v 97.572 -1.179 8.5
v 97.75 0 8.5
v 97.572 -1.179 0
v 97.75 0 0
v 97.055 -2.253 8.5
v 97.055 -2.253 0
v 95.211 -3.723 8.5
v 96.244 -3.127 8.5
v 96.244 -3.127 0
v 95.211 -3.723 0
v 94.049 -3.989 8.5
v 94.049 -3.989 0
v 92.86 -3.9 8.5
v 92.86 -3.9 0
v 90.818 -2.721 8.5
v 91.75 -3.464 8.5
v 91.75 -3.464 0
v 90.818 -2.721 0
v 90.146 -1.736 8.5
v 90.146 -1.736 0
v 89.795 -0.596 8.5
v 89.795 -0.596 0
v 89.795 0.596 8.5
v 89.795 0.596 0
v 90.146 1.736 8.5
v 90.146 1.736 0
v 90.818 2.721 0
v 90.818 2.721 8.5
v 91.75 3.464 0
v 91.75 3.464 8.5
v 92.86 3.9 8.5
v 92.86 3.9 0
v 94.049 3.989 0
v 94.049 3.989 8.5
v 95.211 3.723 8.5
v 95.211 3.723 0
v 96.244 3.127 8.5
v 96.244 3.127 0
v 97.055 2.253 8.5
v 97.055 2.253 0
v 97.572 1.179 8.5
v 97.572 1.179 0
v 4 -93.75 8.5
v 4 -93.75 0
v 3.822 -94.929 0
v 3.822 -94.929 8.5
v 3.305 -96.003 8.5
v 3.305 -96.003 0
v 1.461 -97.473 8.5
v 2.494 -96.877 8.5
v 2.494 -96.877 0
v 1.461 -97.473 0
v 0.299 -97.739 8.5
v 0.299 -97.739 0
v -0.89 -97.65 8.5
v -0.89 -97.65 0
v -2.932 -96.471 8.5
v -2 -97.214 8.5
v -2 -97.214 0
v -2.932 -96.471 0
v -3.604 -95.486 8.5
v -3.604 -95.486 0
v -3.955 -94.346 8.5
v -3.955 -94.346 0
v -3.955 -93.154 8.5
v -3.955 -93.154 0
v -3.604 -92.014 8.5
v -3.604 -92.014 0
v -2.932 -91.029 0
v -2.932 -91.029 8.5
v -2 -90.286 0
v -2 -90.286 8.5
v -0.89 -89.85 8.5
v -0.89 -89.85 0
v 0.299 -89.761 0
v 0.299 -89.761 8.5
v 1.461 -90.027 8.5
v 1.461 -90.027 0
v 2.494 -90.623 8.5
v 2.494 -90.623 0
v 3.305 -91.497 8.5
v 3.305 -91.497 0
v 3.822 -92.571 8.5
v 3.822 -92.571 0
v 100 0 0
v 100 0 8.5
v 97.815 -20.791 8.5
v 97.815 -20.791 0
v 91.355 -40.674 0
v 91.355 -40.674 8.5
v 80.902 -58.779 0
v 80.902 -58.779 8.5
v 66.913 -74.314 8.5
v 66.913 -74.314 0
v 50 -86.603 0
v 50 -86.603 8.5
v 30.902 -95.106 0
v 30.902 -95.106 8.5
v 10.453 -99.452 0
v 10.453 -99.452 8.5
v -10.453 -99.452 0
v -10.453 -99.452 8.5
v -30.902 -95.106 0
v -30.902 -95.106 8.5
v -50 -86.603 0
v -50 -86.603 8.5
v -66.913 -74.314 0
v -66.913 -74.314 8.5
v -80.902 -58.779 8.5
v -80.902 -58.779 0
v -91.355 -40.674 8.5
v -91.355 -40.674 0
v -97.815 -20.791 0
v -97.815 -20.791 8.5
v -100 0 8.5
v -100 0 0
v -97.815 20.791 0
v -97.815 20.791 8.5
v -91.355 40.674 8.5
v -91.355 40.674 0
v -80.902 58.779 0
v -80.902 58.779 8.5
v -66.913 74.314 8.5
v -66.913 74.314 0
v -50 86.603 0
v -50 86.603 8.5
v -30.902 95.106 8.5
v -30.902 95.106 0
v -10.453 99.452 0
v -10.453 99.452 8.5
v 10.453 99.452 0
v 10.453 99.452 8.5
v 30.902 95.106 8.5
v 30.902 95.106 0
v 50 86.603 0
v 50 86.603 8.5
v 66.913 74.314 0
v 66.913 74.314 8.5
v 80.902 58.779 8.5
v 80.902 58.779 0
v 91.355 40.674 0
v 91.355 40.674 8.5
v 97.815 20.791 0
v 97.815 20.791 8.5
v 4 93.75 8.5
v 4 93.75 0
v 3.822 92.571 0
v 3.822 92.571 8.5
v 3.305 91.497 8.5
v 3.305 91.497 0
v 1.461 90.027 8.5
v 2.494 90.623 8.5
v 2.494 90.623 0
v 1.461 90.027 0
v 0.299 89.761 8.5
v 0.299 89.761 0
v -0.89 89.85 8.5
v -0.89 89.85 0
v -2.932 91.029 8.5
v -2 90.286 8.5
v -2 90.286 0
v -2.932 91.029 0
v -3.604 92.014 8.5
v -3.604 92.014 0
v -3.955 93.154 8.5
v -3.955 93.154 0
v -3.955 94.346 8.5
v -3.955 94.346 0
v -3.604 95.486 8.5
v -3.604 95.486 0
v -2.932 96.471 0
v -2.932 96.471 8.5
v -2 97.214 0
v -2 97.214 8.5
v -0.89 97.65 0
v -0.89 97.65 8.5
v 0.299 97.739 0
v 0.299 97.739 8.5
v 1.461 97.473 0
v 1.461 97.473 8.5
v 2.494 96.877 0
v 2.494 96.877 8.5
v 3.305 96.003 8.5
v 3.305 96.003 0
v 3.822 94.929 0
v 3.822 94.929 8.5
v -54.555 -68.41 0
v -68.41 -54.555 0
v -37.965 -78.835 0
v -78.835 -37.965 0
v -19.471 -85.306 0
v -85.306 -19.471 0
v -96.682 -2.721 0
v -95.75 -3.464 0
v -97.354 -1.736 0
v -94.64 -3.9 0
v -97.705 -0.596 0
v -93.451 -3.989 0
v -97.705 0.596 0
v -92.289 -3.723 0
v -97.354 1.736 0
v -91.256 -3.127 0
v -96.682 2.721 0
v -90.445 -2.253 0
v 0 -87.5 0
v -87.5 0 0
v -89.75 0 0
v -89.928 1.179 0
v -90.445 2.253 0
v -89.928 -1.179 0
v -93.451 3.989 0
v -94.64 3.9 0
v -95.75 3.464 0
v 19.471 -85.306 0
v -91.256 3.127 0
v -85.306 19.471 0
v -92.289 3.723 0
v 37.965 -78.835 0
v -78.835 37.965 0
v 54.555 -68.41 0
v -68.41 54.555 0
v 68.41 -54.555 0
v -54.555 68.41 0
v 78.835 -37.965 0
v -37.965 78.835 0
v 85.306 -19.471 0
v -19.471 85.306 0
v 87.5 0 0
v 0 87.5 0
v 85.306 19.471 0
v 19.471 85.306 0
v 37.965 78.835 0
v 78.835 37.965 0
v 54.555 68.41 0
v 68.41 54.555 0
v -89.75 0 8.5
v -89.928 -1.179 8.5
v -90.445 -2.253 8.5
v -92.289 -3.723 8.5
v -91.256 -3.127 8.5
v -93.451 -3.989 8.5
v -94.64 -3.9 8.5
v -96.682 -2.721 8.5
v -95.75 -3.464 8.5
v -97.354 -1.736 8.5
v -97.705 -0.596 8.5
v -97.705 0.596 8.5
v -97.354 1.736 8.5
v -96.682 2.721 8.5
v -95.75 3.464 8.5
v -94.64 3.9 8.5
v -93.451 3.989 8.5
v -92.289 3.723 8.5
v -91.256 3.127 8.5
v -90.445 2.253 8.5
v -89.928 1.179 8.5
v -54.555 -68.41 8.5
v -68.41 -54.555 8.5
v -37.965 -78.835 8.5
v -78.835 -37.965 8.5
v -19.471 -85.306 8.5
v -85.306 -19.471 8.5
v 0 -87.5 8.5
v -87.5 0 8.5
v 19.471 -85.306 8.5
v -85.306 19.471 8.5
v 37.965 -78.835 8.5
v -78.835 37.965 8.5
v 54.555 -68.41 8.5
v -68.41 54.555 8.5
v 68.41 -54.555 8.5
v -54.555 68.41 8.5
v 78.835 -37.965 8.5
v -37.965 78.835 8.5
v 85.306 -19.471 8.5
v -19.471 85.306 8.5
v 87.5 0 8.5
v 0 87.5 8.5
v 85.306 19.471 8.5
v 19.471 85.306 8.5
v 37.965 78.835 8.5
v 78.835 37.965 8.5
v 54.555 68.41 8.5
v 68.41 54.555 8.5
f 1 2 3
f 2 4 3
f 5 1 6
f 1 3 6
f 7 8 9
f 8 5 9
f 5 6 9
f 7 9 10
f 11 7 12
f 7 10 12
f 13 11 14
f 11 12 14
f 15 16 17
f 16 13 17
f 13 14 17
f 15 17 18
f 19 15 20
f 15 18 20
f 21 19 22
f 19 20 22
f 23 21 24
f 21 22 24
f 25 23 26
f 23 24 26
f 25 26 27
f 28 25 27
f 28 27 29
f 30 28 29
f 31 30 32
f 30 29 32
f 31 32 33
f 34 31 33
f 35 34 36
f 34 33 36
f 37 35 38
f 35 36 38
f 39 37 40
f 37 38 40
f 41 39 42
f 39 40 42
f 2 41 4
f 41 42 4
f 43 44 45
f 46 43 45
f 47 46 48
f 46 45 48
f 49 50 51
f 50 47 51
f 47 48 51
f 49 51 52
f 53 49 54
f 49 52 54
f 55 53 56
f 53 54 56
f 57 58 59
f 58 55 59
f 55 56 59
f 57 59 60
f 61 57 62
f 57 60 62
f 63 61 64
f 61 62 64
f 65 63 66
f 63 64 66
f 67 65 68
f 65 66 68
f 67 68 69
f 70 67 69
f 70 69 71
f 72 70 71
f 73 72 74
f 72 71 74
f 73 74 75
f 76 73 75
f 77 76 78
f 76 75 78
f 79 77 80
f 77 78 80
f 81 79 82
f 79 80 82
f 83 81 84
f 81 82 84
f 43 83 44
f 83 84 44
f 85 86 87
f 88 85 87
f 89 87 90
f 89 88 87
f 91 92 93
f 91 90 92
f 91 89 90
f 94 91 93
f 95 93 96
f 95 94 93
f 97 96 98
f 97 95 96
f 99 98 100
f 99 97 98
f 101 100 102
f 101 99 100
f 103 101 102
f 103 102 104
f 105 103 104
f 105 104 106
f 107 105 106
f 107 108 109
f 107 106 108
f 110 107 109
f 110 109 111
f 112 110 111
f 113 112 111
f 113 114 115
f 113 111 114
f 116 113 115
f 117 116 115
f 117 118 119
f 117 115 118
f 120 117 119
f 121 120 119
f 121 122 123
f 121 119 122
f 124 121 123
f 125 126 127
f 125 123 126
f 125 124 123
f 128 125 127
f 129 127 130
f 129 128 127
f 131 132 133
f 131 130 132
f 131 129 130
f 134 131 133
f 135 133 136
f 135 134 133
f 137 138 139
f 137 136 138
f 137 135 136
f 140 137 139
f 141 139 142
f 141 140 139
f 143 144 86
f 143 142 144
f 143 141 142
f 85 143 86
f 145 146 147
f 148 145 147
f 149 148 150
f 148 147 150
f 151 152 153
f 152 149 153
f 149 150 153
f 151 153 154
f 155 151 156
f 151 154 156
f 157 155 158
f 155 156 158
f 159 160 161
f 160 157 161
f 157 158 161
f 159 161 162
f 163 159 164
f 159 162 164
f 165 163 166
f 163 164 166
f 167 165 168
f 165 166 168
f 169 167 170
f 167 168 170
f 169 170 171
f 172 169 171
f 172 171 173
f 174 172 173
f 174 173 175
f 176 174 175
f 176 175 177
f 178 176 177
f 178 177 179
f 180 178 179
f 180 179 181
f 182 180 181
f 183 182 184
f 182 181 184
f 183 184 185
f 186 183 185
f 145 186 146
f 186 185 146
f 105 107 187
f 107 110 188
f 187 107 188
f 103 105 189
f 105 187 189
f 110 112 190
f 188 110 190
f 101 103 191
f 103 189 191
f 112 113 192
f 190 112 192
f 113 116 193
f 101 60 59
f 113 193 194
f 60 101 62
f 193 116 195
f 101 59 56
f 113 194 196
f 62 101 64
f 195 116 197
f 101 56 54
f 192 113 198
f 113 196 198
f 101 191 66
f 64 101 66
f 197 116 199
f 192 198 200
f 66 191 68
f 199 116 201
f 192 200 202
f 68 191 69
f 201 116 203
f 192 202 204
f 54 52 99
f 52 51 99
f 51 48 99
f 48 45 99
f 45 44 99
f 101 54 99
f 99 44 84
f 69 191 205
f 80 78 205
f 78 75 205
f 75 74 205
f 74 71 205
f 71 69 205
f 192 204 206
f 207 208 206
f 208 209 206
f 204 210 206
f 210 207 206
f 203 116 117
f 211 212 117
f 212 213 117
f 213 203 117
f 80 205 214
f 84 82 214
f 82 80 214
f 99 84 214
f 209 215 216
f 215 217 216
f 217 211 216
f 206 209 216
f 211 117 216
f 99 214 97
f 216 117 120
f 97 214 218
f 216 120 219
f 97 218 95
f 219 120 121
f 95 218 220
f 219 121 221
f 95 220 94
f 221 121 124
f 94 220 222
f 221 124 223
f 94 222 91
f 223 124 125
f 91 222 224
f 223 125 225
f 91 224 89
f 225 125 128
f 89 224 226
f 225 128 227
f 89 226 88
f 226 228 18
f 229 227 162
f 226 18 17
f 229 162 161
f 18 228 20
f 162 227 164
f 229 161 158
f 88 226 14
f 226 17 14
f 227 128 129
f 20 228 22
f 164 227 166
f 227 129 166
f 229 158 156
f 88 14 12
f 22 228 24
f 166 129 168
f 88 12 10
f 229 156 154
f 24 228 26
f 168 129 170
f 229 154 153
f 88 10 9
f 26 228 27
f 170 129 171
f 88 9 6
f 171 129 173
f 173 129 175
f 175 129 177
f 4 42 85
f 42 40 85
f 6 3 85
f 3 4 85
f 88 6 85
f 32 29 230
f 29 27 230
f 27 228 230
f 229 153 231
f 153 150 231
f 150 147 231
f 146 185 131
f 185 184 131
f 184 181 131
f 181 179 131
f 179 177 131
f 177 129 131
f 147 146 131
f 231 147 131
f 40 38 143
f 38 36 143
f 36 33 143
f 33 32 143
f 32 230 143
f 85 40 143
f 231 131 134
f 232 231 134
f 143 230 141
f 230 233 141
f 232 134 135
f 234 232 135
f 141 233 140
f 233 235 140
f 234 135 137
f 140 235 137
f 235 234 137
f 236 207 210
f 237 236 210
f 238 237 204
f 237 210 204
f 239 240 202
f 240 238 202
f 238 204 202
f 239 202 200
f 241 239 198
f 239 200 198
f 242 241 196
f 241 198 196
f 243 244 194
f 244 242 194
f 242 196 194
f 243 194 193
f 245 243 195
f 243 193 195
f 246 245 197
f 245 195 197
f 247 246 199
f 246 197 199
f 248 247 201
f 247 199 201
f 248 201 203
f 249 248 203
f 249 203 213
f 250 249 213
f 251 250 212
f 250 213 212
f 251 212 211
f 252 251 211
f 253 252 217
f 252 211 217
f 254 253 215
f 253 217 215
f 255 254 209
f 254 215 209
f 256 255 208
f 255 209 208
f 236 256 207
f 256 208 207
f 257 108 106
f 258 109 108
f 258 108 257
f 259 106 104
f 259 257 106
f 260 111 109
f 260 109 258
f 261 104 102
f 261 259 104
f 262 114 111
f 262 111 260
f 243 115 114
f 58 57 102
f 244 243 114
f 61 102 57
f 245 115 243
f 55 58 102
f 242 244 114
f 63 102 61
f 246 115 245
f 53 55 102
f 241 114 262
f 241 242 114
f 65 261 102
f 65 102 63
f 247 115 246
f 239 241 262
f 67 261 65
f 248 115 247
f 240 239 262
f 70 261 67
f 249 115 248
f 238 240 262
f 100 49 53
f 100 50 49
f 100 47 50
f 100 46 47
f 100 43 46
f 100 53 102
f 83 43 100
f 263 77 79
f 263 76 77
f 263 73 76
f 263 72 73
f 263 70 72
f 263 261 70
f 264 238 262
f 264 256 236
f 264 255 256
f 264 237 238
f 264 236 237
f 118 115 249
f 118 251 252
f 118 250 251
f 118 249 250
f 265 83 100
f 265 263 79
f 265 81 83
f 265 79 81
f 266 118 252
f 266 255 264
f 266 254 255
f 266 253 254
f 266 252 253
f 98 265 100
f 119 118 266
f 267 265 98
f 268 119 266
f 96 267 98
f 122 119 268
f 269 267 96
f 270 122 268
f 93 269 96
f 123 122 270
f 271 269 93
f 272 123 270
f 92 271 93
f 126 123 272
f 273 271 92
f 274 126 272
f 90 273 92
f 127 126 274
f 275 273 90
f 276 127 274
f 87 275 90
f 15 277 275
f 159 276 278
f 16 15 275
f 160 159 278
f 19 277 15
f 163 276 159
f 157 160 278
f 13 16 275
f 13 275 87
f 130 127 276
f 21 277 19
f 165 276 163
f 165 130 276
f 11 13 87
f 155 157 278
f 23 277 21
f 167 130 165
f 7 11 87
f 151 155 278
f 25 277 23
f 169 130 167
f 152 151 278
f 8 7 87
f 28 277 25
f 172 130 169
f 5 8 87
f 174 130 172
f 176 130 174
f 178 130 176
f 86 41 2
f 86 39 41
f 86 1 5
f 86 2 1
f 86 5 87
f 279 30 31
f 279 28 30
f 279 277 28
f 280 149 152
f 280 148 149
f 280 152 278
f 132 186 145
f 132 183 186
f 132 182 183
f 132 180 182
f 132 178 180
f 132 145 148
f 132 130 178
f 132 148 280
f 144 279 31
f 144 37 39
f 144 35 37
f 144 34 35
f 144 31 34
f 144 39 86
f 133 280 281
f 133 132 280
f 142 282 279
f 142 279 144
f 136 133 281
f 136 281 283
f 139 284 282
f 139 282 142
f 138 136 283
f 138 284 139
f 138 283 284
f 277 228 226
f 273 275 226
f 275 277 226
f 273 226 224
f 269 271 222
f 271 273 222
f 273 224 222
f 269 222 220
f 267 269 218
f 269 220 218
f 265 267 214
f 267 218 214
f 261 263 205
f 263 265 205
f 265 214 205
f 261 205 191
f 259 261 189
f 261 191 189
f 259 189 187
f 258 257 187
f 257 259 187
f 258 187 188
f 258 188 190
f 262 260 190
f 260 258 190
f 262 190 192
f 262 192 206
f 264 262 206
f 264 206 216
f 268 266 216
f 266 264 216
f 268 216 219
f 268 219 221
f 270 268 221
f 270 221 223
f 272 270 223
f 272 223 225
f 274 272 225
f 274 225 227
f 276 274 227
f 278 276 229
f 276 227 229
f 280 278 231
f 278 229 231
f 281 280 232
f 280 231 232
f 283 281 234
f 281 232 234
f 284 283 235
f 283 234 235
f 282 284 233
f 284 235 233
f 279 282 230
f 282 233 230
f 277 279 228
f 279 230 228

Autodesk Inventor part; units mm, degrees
ref_plane "YZ Plane" through (0, 0, 0) normal (1, 0, 0) x (0, 1, 0)
ref_plane "XZ Plane" through (0, 0, 0) normal (0, 1, 0) x (-1, 0, 0)
ref_plane "XY Plane" through (0, 0, 0) normal (0, 0, 1) x (1, 0, 0)
sketch "スケッチ1" plane through (0, 0, 0) normal (0, 0, 1) x (1, 0, 0)
  circle A0 centre (0, 0) radius 87.5
  circle A1 centre (0, 0) radius 100
  circle A2 centre (0, 0) radius 93.75 construction
  circle A3 centre (0, 93.75) radius 4
  circle A4 centre (93.75, 0) radius 4
  circle A5 centre (0, -93.75) radius 4
  circle A6 centre (-93.75, 0) radius 4
  dimension "d0" = 175
  dimension "d1" = 200
  dimension "d2" = 187.5
  dimension "d3" = 8
  dimension "d4" = 8
  dimension "d5" = 8
  dimension "d6" = 8
extrude "押し出し1" add sketch "スケッチ1" along normal blind 8.5
properties part number "ベアリング 外側"
